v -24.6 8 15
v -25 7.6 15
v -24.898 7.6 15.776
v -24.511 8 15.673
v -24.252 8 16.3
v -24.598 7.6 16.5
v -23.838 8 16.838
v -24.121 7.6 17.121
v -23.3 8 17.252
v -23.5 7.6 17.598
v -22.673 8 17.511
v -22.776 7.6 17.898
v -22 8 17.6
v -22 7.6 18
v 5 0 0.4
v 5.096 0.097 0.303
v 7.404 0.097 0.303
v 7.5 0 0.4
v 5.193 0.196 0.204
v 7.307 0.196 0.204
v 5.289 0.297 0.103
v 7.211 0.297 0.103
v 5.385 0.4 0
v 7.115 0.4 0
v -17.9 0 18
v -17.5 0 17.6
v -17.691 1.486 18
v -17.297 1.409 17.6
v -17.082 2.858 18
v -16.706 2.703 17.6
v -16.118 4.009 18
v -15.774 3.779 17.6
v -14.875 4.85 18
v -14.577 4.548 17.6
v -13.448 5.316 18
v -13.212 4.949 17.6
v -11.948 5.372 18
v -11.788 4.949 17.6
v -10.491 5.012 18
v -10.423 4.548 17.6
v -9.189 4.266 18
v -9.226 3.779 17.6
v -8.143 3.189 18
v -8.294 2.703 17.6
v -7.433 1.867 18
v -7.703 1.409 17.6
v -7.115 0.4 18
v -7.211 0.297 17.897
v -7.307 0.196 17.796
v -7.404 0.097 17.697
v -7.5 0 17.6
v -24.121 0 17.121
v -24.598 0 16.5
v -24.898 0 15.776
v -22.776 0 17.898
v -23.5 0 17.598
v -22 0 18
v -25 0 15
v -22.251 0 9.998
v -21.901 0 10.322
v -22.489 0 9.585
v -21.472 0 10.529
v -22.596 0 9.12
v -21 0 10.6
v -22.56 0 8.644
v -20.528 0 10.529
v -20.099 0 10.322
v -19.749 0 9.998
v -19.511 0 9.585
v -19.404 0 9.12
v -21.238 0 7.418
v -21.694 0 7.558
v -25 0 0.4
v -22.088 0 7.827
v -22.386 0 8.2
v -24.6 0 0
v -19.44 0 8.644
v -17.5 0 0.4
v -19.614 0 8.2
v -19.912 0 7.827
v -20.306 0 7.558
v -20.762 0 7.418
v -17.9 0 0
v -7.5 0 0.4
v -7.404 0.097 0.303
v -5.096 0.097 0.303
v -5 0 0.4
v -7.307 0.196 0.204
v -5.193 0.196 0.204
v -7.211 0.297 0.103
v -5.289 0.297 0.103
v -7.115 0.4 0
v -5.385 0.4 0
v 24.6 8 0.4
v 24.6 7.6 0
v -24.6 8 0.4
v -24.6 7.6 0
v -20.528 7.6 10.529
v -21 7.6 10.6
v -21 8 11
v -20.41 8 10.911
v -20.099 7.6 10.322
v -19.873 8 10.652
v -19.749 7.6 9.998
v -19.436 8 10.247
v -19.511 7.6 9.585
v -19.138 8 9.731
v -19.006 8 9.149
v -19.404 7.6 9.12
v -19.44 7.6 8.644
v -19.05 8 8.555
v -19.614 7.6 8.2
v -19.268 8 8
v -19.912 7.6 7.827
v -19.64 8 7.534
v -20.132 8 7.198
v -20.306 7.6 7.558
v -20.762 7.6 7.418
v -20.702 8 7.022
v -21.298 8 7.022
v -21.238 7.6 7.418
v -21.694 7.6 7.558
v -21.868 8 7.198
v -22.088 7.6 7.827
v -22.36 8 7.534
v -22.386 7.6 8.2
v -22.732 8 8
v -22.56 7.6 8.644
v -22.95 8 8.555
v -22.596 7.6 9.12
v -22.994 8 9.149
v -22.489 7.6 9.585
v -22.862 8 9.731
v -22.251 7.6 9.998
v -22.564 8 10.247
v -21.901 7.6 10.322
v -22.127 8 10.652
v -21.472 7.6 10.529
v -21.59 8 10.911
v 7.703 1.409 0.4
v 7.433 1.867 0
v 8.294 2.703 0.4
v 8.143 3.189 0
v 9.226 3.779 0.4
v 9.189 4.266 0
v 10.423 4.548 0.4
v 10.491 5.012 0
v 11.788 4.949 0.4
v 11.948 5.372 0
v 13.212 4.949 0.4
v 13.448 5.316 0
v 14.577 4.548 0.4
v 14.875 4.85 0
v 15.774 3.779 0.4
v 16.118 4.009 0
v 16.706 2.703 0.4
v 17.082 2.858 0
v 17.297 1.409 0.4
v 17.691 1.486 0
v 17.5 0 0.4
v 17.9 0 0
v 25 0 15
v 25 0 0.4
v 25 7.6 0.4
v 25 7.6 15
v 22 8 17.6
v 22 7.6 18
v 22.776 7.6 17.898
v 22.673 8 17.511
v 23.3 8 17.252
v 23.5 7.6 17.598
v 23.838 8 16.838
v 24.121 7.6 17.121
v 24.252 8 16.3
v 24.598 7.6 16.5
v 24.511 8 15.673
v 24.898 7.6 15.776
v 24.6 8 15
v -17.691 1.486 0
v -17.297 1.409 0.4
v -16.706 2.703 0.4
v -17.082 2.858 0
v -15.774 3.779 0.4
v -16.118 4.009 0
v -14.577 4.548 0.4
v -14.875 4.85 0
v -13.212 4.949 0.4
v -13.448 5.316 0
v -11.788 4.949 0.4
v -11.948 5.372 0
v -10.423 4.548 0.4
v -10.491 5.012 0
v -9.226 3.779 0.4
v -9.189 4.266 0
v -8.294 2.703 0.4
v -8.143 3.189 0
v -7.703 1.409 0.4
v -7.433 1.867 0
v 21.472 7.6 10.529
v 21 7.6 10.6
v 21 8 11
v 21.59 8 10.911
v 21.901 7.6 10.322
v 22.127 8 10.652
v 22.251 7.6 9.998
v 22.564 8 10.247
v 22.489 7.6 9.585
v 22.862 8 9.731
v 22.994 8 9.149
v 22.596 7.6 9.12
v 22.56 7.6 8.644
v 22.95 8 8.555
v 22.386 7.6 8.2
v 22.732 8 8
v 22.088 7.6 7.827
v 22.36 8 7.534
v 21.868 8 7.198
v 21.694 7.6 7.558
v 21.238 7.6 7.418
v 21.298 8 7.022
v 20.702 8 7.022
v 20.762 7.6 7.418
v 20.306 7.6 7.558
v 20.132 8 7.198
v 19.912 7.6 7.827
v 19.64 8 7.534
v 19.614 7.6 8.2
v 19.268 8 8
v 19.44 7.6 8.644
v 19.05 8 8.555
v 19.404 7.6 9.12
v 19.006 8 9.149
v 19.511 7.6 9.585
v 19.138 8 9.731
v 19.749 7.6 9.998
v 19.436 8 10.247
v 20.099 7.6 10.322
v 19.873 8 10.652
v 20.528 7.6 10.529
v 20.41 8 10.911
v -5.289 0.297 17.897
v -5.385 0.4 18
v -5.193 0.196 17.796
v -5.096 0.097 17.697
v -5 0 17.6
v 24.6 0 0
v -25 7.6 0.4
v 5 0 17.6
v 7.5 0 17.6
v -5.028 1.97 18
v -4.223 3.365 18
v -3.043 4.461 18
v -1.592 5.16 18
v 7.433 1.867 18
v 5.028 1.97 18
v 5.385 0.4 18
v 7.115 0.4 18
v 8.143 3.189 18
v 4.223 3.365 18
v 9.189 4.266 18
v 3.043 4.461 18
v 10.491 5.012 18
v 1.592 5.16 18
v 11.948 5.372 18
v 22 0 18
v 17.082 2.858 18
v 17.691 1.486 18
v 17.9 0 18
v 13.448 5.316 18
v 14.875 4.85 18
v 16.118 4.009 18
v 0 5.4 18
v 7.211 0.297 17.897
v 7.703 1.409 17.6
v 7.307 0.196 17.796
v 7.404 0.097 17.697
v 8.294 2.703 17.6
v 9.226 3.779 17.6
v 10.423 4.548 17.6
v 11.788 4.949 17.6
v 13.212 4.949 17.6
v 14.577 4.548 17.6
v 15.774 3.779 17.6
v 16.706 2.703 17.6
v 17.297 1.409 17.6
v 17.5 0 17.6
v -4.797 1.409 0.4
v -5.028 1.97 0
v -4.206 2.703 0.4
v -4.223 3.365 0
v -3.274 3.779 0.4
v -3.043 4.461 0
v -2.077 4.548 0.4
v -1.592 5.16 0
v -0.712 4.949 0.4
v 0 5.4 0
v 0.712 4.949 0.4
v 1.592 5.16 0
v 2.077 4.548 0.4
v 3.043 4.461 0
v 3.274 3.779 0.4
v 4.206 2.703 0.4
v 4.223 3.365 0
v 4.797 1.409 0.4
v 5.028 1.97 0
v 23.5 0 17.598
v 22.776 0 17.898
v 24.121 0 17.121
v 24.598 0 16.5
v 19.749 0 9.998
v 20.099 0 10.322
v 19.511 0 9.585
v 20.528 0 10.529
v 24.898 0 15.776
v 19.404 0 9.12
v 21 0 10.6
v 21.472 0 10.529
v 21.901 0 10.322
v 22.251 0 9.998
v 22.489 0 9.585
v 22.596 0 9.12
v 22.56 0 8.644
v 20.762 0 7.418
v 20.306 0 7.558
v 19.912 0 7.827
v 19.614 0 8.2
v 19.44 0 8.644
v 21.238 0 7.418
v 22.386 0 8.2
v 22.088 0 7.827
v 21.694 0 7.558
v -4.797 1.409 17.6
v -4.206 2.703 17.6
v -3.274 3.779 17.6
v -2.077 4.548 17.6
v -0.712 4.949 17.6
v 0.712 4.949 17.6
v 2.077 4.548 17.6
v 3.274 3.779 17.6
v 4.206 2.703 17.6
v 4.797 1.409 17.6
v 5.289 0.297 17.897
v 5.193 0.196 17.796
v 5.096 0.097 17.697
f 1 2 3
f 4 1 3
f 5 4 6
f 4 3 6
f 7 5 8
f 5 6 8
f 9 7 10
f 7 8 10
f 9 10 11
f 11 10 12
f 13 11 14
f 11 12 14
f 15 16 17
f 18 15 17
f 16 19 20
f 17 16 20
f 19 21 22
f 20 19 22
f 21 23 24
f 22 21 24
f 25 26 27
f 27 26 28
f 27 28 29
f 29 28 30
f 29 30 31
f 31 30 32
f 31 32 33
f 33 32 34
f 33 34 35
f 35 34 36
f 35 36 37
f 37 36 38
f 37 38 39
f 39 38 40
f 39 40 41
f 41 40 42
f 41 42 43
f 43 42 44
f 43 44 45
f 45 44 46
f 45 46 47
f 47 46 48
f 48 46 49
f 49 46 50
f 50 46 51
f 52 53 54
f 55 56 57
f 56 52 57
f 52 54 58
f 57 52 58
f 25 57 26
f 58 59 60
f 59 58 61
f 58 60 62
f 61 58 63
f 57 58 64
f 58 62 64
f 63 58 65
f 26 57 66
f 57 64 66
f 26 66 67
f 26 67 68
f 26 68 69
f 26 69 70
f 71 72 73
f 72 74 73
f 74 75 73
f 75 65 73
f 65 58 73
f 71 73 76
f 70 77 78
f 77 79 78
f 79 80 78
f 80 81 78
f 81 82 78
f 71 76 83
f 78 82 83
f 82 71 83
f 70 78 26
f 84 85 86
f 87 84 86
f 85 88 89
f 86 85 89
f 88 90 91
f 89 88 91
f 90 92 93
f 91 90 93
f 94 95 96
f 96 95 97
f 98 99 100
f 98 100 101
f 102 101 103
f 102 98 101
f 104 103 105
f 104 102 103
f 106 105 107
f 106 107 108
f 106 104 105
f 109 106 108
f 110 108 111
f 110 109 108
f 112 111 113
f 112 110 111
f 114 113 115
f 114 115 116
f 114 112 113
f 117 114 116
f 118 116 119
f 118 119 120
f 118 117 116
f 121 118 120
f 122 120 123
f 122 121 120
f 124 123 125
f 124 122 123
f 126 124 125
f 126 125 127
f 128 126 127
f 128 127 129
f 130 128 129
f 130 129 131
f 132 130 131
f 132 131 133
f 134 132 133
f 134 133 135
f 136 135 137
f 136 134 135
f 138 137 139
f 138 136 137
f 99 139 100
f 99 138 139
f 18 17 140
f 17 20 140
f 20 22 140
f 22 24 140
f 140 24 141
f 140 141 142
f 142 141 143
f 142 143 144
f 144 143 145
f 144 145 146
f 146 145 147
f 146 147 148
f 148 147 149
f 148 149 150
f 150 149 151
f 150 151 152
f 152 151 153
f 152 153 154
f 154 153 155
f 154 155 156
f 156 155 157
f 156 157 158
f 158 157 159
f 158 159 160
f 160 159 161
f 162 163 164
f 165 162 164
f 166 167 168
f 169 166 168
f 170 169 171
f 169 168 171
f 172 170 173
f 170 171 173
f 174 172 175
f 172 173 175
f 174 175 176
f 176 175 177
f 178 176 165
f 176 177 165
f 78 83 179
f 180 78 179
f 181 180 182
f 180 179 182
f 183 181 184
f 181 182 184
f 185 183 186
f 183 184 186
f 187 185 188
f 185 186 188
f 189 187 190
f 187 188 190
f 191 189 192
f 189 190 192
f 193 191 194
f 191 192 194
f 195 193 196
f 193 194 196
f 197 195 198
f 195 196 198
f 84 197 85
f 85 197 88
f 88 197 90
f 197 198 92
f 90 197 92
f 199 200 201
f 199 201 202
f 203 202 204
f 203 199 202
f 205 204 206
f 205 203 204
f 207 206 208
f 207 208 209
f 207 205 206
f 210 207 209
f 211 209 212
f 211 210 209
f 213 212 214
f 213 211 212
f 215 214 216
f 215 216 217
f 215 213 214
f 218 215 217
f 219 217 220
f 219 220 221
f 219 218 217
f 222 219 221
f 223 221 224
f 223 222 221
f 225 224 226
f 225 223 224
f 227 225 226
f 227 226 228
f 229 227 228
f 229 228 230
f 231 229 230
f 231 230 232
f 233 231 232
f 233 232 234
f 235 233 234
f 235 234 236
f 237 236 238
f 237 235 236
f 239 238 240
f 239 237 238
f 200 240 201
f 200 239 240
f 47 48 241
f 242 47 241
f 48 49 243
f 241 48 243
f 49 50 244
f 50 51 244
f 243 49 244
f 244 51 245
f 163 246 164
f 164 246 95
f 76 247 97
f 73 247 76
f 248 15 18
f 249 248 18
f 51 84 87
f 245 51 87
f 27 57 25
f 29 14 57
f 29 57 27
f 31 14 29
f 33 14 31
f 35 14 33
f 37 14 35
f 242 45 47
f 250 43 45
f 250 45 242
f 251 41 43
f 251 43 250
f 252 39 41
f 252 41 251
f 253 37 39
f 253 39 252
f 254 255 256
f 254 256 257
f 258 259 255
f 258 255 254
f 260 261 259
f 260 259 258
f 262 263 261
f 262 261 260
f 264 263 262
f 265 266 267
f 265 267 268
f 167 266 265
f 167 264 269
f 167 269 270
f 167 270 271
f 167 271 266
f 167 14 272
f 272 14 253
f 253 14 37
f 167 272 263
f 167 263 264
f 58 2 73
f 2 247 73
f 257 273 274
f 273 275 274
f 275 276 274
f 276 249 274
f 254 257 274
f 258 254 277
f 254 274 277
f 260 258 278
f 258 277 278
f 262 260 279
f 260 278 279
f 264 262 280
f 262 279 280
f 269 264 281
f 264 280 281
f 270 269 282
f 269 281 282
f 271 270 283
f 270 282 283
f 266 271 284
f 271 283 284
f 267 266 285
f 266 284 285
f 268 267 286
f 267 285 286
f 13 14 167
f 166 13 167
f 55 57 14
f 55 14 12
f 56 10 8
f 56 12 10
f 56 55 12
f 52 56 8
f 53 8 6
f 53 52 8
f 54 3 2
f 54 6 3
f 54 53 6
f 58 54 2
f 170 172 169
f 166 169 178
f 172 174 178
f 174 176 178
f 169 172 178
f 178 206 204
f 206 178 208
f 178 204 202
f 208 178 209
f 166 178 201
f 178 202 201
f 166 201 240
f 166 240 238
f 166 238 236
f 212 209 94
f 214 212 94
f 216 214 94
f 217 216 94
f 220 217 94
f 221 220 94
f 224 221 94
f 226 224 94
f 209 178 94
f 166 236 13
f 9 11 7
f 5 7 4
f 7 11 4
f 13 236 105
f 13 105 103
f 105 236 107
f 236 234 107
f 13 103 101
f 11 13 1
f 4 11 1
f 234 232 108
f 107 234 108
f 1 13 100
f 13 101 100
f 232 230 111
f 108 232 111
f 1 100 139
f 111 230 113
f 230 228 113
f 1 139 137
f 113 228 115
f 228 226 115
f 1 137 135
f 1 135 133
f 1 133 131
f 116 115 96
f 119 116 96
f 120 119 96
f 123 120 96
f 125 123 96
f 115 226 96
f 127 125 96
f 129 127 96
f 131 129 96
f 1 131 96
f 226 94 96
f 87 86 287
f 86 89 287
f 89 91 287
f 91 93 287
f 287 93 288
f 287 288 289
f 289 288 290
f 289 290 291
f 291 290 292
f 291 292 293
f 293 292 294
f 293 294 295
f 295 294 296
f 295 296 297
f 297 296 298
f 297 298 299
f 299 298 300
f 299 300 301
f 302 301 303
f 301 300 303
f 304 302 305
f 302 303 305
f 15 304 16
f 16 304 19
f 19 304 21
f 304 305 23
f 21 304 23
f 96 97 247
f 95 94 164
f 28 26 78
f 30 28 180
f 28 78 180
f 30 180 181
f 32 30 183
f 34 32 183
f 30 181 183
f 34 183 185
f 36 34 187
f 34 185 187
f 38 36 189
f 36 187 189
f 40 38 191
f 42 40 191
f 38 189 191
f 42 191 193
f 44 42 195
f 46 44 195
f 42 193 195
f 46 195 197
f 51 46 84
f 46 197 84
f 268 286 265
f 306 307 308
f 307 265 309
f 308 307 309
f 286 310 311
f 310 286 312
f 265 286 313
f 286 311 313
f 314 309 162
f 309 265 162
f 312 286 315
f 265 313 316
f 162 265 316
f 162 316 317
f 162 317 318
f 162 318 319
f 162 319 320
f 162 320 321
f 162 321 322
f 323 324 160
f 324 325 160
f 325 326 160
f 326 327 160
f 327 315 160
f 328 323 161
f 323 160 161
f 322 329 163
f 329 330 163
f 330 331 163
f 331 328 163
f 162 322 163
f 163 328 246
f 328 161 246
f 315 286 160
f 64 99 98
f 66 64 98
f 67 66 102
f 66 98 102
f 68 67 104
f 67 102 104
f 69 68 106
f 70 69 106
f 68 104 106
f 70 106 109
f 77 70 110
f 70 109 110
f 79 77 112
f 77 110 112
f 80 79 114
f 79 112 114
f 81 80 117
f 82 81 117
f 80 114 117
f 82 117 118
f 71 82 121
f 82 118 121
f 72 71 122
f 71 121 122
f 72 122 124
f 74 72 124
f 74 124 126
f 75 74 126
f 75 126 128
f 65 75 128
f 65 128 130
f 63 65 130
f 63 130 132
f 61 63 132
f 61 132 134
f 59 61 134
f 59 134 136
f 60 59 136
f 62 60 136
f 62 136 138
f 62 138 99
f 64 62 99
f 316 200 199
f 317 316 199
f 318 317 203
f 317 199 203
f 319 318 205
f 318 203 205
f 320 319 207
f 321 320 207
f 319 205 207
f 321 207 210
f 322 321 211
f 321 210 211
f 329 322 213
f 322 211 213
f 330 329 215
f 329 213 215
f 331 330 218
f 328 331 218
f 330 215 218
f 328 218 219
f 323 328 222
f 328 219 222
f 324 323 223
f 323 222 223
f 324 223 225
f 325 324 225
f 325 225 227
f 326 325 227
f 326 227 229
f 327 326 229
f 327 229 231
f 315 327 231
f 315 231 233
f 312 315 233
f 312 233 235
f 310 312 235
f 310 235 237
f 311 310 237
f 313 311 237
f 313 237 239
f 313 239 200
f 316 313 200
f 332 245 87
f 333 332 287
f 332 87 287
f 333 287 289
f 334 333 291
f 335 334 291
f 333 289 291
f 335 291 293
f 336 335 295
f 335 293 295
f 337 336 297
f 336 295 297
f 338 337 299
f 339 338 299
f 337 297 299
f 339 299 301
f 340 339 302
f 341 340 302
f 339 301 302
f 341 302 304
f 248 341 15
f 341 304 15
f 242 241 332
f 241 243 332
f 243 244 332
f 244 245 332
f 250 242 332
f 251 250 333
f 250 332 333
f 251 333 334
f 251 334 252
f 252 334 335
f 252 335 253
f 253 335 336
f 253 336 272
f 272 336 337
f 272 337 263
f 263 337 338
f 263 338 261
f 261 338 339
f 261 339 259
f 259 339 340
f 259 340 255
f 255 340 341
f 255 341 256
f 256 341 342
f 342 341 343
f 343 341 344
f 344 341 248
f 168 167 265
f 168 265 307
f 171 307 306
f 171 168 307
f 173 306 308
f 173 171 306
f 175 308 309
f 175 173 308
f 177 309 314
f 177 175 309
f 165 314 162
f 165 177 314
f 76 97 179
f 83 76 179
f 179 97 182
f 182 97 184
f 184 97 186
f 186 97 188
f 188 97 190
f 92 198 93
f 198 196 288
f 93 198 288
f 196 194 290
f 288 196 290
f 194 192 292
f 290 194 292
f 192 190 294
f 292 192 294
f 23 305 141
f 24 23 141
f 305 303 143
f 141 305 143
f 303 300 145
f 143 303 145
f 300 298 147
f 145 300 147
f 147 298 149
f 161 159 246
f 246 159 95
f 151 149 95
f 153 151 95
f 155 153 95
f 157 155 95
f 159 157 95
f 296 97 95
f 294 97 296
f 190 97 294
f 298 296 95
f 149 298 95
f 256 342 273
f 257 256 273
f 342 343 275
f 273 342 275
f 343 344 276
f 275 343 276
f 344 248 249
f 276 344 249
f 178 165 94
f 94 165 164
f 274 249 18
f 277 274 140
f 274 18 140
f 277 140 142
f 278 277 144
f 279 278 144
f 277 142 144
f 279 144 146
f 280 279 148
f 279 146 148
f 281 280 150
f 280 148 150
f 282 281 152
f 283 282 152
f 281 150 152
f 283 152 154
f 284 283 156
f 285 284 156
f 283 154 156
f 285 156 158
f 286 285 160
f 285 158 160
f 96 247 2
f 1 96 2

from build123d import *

# Parameters (mm, degrees)
BOSS_EXTRUDE1_DEPTH = 18
SKETCH2_R           = 1.6
CUT_EXTRUDE1_DEPTH  = 32.827660926
FILLET1_R           = 3
CHAMFER1_SIZE       = 0.4


with BuildPart() as part:
    # Sketch1 → Boss-Extrude1 (new body)
    with BuildSketch(Plane.XY):
        with BuildLine():
            Line((-7.5, 0), (-5, 0))
            ThreePointArc((-5, 0), (0, 5), (5, 0))
            Line((5, 0), (7.5, 0))
            ThreePointArc((7.5, 0), (12.5, 5), (17.5, 0))
            Line((17.5, 0), (25, 0))
            Line((25, 0), (25, 8))
            Line((25, 8), (-25, 8))
            Line((-25, 8), (-25, 0))
            Line((-25, 0), (-17.5, 0))
            ThreePointArc((-17.5, 0), (-12.5, 5), (-7.5, 0))
        make_face()
    extrude(amount=BOSS_EXTRUDE1_DEPTH)

    # Sketch2 → Cut-Extrude1 (cut, through all)
    with BuildSketch(Plane(origin=(0, 8, 0), x_dir=(1, 0, 0), z_dir=(0, 1, 0))):
        with Locations(Location((-21, -9, 0), (0, 0, 270))):
            Circle(SKETCH2_R)
        with Locations(Location((21, -9, 0), (0, 0, 270))):
            Circle(SKETCH2_R)
    extrude(amount=-CUT_EXTRUDE1_DEPTH, mode=Mode.SUBTRACT)

    # Fillet1
    fillet1_edges = [part.edges().sort_by_distance(p)[0] for p in [
        (25, 4, 18),
        (-25, 4, 18),
    ]]
    fillet(fillet1_edges, radius=FILLET1_R)

    # Chamfer1
    chamfer1_edges = [part.edges().sort_by_distance(p)[0] for p in [
        (21, 8, 7.4),
        (-21, 8, 7.4),
        (12.5, 5, 0),
        (0, 5, 0),
        (-12.5, 5, 0),
        (0, 8, 0),
        (-25, 4, 0),
        (-25, 8, 7.5),
        (-24.121320344, 8, 17.121320344),
        (0, 8, 18),
        (24.121320344, 8, 17.121320344),
        (25, 8, 7.5),
        (25, 4, 0),
        (12.5, 5, 18),
        (0, 5, 18),
        (-12.5, 5, 18),
        (6.25, 0, 0),
        (-6.25, 0, 0),
        (6.25, 0, 18),
        (-6.25, 0, 18),
    ]]
    chamfer(chamfer1_edges, length=CHAMFER1_SIZE)


solid = part.part
